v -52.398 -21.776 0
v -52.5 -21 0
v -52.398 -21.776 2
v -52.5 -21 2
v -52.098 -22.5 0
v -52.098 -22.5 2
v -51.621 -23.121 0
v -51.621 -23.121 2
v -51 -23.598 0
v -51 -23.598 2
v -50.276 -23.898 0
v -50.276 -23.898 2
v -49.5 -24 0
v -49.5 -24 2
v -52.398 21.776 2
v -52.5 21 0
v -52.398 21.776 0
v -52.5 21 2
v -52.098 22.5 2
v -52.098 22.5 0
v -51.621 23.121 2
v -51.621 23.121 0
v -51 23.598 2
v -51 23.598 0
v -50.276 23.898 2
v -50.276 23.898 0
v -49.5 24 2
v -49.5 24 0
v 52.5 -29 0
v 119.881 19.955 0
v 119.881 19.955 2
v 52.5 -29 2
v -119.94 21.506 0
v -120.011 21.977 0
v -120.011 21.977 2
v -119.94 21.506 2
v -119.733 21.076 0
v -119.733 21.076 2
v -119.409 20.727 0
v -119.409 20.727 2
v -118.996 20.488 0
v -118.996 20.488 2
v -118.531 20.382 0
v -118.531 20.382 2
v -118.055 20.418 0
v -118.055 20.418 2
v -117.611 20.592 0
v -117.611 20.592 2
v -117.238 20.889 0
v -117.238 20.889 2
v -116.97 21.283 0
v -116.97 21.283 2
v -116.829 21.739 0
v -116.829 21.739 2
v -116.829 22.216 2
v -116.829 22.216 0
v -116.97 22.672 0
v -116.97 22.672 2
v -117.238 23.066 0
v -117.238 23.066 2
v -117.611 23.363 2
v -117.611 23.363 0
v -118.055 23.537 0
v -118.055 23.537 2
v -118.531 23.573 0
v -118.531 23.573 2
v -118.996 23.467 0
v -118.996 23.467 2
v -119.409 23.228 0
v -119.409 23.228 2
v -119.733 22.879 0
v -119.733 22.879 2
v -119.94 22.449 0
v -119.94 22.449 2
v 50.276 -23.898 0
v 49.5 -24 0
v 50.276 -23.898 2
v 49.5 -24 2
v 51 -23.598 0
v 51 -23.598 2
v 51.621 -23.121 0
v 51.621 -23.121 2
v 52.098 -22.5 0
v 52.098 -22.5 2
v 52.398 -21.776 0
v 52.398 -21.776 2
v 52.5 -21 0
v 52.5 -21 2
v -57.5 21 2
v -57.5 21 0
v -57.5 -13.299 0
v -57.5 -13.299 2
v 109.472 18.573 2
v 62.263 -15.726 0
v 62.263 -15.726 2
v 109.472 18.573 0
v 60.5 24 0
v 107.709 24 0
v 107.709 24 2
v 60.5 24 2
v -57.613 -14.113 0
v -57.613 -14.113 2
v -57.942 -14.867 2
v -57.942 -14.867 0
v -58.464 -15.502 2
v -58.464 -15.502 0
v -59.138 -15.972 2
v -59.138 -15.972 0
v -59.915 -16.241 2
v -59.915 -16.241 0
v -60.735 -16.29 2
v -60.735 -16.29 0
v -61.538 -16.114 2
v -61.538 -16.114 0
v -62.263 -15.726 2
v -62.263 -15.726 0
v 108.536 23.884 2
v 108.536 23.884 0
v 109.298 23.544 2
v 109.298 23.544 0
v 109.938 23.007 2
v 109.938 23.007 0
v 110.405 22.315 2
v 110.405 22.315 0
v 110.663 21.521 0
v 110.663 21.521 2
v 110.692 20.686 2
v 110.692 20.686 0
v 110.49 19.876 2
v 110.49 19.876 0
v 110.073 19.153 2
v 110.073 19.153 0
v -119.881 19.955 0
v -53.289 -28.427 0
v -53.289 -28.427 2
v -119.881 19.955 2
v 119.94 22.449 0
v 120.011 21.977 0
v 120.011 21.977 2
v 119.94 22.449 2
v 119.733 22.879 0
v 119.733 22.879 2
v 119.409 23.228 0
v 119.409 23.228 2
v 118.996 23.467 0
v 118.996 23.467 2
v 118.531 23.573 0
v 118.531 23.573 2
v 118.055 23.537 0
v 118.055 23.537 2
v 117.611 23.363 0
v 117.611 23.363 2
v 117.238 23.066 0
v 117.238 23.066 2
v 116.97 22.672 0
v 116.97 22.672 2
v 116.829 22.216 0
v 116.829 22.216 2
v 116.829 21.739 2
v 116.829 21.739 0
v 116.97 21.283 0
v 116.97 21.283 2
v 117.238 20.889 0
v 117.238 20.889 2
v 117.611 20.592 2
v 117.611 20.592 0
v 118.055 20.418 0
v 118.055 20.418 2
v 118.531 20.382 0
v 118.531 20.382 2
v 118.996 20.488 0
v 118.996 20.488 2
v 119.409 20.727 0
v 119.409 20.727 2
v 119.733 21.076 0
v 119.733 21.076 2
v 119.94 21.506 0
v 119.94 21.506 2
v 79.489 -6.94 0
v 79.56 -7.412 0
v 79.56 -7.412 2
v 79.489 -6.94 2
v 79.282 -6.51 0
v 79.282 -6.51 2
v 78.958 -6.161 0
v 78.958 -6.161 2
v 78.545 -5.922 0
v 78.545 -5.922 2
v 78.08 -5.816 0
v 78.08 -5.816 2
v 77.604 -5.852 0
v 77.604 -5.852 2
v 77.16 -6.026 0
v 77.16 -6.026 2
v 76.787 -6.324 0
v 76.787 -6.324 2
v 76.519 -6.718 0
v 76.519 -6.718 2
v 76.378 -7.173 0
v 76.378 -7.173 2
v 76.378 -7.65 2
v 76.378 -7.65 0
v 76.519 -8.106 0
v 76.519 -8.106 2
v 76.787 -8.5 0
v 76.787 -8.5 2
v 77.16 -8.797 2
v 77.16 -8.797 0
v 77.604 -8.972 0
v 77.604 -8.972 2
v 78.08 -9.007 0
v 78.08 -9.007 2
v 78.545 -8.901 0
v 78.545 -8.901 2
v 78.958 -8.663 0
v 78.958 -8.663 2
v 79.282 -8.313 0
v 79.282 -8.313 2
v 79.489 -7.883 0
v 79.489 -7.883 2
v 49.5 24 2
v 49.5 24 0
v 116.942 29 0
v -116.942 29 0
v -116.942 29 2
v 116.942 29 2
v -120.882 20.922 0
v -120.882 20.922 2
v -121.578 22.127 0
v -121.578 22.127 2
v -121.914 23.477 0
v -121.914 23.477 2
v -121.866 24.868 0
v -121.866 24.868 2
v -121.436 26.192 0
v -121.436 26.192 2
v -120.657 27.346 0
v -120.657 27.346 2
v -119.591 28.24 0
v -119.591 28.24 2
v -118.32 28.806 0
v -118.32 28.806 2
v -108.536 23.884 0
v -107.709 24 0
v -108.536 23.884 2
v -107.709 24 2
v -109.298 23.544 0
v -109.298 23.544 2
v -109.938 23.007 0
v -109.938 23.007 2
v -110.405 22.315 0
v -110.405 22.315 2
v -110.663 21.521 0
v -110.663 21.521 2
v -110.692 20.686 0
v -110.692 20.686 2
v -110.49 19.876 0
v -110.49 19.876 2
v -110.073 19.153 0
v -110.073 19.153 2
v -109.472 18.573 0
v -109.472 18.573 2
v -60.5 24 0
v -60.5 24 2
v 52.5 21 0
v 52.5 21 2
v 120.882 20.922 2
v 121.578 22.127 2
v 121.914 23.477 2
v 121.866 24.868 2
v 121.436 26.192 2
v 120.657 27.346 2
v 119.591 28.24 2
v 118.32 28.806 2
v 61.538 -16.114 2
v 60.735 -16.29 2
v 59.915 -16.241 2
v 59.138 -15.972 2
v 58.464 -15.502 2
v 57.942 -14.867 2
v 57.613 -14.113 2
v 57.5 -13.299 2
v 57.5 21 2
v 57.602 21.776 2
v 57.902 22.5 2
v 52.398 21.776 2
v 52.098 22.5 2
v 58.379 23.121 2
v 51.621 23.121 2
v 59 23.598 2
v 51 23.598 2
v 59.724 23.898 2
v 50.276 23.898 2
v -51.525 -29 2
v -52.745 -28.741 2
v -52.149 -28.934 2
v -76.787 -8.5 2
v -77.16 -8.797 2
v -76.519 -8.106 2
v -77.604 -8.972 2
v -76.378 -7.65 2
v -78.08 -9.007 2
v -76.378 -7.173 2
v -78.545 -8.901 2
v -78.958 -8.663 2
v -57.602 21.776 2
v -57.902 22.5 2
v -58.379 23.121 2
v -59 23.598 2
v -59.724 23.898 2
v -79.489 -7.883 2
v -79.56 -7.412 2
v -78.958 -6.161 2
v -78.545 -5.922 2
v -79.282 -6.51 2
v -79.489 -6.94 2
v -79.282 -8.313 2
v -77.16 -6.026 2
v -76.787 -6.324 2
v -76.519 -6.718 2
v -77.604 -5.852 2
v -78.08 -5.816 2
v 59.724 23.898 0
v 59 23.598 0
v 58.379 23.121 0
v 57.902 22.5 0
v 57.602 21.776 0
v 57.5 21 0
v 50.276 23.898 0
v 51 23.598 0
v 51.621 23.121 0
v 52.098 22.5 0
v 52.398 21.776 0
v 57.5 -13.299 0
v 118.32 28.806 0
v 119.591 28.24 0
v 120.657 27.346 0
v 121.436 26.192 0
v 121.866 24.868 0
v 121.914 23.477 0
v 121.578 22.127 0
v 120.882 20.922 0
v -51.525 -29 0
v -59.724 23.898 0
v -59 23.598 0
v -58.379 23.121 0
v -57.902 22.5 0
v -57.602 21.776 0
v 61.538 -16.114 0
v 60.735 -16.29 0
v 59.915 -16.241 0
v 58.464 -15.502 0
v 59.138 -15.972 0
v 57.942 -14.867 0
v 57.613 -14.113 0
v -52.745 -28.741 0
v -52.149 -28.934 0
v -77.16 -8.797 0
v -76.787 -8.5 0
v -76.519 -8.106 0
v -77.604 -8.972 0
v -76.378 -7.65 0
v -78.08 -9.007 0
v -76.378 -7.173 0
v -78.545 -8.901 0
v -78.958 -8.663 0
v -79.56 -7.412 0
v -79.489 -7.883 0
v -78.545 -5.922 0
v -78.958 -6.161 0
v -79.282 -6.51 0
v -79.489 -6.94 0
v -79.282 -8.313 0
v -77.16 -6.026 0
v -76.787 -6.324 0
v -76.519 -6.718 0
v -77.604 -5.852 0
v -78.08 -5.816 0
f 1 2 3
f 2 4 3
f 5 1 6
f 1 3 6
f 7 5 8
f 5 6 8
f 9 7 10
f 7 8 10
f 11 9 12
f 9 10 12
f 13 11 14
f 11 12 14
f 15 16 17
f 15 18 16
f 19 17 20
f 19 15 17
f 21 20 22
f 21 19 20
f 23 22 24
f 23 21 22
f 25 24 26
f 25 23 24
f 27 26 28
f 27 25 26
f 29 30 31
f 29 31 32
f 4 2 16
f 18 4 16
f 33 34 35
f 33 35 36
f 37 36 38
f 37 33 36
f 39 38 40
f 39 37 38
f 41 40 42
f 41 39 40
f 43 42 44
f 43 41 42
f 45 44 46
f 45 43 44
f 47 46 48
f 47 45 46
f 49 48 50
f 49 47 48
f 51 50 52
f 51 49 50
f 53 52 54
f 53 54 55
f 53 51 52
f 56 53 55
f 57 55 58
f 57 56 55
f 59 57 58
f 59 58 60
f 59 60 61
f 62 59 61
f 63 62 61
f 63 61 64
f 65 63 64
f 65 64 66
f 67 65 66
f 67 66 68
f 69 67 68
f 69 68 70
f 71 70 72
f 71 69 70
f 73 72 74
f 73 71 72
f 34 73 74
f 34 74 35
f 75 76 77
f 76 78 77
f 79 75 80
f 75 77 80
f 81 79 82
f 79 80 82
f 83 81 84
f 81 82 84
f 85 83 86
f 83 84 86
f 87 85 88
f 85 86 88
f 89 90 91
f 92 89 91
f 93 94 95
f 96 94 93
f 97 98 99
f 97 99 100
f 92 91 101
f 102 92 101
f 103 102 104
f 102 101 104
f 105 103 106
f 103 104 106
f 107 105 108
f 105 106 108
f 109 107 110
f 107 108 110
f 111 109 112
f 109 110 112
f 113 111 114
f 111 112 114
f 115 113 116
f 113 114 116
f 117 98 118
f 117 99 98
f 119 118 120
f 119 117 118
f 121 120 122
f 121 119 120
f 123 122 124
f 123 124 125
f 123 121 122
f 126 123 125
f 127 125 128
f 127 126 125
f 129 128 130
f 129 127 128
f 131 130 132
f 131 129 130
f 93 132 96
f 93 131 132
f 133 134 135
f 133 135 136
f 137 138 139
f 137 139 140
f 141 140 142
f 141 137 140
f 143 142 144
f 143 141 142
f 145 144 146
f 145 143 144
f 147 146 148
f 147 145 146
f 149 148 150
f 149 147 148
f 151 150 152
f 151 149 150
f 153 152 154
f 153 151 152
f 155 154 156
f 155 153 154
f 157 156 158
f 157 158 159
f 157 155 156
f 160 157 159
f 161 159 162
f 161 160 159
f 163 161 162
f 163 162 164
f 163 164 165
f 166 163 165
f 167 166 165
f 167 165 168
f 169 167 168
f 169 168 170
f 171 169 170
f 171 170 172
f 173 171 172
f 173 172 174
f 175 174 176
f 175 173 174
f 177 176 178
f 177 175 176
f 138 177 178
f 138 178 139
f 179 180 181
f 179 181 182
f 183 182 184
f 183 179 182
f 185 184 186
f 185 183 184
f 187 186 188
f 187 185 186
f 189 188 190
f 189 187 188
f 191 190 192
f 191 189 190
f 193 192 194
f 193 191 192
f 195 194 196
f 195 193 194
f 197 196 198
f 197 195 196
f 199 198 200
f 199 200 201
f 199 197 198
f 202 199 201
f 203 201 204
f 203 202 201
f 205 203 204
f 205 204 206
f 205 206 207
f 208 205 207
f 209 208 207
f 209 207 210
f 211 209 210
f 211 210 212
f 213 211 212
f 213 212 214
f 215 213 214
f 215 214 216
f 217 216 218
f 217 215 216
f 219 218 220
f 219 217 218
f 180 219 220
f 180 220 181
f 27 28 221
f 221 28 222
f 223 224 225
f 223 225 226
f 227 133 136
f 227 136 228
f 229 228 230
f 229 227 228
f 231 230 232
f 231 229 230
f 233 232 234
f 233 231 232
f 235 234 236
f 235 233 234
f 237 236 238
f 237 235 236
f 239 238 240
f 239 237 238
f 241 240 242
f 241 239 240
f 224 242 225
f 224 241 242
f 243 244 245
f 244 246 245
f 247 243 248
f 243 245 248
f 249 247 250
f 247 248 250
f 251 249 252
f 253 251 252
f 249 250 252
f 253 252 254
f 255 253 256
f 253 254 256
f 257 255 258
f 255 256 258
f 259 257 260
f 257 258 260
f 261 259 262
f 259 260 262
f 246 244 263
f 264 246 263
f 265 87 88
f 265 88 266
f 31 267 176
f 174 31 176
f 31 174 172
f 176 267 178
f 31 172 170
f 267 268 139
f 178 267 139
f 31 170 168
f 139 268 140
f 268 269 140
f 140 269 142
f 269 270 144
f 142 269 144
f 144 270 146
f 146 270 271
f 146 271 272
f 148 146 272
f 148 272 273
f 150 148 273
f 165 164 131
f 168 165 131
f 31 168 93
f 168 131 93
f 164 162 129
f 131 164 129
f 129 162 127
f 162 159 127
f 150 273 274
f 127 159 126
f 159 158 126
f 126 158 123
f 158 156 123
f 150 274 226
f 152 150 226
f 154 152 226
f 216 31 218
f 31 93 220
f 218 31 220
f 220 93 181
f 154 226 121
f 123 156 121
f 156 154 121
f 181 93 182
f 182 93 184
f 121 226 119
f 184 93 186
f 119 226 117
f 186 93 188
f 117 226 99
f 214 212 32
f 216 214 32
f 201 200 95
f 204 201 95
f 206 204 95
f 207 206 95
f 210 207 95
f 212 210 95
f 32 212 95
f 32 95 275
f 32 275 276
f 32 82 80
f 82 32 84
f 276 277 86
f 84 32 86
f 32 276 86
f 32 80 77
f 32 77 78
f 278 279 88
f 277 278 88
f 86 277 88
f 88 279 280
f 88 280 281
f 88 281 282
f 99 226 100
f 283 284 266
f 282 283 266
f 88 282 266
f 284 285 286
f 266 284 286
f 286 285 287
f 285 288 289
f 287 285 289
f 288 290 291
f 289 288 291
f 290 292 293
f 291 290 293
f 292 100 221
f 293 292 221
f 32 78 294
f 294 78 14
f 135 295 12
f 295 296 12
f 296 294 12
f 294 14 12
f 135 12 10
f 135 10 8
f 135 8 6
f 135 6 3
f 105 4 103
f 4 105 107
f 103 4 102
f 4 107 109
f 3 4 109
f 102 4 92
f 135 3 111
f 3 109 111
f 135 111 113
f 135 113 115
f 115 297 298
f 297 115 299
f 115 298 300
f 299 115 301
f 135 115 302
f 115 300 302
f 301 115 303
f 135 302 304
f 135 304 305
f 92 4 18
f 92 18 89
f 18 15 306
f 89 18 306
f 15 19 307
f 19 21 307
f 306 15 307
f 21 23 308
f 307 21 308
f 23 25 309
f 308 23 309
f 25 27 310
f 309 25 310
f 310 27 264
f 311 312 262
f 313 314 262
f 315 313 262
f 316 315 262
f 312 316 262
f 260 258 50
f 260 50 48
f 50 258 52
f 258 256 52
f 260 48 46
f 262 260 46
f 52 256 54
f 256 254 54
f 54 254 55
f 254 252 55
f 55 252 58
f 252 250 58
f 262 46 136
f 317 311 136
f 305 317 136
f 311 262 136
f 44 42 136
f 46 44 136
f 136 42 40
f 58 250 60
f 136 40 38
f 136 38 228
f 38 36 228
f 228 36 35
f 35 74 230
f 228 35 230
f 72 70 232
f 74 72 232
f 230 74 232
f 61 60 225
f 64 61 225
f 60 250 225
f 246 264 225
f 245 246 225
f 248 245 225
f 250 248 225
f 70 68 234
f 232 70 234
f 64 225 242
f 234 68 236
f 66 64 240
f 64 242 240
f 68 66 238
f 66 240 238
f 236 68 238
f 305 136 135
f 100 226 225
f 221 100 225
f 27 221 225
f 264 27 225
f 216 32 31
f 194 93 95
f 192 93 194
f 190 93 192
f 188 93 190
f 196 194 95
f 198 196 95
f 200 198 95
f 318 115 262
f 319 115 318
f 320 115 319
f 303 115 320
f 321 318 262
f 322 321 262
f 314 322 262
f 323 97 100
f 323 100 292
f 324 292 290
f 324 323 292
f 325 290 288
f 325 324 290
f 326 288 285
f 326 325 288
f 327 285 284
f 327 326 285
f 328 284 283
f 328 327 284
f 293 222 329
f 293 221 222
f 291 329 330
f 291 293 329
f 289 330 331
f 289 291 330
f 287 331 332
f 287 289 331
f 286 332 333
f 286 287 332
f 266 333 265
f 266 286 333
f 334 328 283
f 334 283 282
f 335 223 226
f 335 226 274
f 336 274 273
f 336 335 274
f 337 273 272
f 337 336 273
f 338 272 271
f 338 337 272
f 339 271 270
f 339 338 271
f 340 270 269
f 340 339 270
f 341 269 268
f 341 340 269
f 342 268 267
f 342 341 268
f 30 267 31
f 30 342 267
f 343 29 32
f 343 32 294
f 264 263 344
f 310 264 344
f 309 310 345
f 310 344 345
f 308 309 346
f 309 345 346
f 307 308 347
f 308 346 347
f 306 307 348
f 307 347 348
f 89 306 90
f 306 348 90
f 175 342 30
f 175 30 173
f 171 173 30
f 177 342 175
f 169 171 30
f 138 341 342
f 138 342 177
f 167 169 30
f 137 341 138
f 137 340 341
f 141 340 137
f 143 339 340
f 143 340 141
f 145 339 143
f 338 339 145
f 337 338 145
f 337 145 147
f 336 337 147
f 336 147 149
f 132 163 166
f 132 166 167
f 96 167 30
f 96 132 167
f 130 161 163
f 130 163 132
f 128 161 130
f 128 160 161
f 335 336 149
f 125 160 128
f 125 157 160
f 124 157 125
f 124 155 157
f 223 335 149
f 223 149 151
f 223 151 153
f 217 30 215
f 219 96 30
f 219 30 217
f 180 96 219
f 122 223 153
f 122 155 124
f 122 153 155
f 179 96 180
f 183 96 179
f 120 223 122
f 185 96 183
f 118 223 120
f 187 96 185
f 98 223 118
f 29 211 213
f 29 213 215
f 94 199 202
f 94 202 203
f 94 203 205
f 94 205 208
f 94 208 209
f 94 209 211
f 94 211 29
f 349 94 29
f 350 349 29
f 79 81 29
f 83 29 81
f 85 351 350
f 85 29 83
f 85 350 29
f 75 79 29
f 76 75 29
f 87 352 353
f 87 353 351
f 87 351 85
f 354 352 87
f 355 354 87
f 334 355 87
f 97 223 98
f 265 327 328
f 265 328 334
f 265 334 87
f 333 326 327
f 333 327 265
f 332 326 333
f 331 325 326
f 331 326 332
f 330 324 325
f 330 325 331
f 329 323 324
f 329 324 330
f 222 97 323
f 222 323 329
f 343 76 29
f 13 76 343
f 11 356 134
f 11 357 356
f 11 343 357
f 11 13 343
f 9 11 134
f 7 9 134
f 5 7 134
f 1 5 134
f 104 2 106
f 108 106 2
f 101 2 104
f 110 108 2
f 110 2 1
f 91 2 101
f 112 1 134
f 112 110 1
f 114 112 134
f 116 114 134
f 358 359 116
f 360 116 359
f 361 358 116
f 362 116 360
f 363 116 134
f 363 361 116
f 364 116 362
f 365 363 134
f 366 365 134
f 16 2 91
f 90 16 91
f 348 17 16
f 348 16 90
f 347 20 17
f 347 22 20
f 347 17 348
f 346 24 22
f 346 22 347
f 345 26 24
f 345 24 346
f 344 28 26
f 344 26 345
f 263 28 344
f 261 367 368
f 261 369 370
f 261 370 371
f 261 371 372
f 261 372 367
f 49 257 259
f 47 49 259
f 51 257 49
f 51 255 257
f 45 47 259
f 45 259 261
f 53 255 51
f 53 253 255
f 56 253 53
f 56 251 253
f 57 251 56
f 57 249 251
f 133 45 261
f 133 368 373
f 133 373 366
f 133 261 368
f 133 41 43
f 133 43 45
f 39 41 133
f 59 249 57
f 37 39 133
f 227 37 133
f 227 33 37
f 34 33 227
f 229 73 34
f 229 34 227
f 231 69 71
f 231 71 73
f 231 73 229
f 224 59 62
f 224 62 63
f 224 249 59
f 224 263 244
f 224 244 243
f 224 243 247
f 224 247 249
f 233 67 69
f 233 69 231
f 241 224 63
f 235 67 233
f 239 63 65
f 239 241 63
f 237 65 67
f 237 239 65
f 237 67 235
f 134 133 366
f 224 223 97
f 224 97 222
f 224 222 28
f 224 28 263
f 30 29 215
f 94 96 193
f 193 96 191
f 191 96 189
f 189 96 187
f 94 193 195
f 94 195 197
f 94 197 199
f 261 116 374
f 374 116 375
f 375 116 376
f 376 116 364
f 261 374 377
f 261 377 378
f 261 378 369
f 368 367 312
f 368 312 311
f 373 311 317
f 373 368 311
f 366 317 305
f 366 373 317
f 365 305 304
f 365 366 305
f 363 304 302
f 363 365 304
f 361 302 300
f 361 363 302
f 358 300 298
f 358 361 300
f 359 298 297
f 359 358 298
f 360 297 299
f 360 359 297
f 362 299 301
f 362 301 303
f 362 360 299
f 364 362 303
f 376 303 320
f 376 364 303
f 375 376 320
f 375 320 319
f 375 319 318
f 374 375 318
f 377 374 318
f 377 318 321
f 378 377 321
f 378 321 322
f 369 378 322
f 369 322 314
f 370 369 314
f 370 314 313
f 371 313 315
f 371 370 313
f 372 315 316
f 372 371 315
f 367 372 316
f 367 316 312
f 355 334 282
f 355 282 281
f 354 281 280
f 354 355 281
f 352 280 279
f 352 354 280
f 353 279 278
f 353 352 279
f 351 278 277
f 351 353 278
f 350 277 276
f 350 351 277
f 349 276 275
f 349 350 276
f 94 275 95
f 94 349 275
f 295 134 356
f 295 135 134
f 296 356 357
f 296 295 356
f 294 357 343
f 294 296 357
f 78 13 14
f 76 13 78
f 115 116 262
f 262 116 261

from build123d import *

# Parameters (mm, degrees)
SKETCH_1_R      = 1.6
SKETCH_1_W      = 105
SKETCH_1_H      = 48
EXTRUDE_1_DEPTH = 2
FILLET_1_R      = 3


with BuildPart() as part:
    # ｽｹｯﾁ1 → ﾎﾞｽ - 押し出し1 (new body)
    with BuildSketch(Plane.XY):
        with BuildLine():
            Line((-116.941733701, 29), (116.941733701, 29))
            ThreePointArc((116.941733701, 29), (121.697016283, 25.545084972), (119.880659963, 19.954915028))
            Line((119.880659963, 19.954915028), (52.5, -29))
            Line((52.5, -29), (-52.5, -29))
            Line((-52.5, -29), (-119.880659963, 19.954915028))
            ThreePointArc((-119.880659963, 19.954915028), (-121.697016283, 25.545084972), (-116.941733701, 29))
        make_face()
        with Locations((118.411196832, 21.977457514)):
            Circle(SKETCH_1_R, mode=Mode.SUBTRACT)
        with Locations((77.960347113, -7.411805101)):
            Circle(SKETCH_1_R, mode=Mode.SUBTRACT)
        with Locations(Location((-118.411196832, 21.977457514, 0), (0, 0, 180))):
            Circle(SKETCH_1_R, mode=Mode.SUBTRACT)
        with Locations(Location((-77.960347113, -7.411805101, 0), (0, 0, 180))):
            Circle(SKETCH_1_R, mode=Mode.SUBTRACT)
        Rectangle(SKETCH_1_W, SKETCH_1_H, mode=Mode.SUBTRACT)
        with BuildLine():
            Line((-57.5, 21), (-57.5, -13.299115956))
            ThreePointArc((-57.5, -13.299115956), (-59.138028501, -15.972135529), (-62.263355757, -15.726166939))
            Line((-62.263355757, -15.726166939), (-116.941733701, 24))
            Line((-116.941733701, 24), (-60.5, 24))
            ThreePointArc((-60.5, 24), (-58.378679656, 23.121320344), (-57.5, 21))
        make_face(mode=Mode.SUBTRACT)
        with BuildLine():
            Line((62.263355757, -15.726166939), (116.941733701, 24))
            Line((116.941733701, 24), (60.5, 24))
            ThreePointArc((60.5, 24), (58.378679656, 23.121320344), (57.5, 21))
            Line((57.5, 21), (57.5, -13.299115956))
            ThreePointArc((57.5, -13.299115956), (59.138028501, -15.972135529), (62.263355757, -15.726166939))
        make_face(mode=Mode.SUBTRACT)
    extrude(amount=EXTRUDE_1_DEPTH)

    # ﾌｨﾚｯﾄ1
    fillet_1_edges = [part.edges().sort_by_distance(p)[0] for p in [
        (-52.5, -29, 1),
        (-52.5, 24, 1),
        (-52.5, -24, 1),
        (52.5, -24, 1),
        (52.5, 24, 1),
        (116.941733701, 24, 1),
        (-116.941733701, 24, 1),
    ]]
    fillet(fillet_1_edges, radius=FILLET_1_R)


solid = part.part
